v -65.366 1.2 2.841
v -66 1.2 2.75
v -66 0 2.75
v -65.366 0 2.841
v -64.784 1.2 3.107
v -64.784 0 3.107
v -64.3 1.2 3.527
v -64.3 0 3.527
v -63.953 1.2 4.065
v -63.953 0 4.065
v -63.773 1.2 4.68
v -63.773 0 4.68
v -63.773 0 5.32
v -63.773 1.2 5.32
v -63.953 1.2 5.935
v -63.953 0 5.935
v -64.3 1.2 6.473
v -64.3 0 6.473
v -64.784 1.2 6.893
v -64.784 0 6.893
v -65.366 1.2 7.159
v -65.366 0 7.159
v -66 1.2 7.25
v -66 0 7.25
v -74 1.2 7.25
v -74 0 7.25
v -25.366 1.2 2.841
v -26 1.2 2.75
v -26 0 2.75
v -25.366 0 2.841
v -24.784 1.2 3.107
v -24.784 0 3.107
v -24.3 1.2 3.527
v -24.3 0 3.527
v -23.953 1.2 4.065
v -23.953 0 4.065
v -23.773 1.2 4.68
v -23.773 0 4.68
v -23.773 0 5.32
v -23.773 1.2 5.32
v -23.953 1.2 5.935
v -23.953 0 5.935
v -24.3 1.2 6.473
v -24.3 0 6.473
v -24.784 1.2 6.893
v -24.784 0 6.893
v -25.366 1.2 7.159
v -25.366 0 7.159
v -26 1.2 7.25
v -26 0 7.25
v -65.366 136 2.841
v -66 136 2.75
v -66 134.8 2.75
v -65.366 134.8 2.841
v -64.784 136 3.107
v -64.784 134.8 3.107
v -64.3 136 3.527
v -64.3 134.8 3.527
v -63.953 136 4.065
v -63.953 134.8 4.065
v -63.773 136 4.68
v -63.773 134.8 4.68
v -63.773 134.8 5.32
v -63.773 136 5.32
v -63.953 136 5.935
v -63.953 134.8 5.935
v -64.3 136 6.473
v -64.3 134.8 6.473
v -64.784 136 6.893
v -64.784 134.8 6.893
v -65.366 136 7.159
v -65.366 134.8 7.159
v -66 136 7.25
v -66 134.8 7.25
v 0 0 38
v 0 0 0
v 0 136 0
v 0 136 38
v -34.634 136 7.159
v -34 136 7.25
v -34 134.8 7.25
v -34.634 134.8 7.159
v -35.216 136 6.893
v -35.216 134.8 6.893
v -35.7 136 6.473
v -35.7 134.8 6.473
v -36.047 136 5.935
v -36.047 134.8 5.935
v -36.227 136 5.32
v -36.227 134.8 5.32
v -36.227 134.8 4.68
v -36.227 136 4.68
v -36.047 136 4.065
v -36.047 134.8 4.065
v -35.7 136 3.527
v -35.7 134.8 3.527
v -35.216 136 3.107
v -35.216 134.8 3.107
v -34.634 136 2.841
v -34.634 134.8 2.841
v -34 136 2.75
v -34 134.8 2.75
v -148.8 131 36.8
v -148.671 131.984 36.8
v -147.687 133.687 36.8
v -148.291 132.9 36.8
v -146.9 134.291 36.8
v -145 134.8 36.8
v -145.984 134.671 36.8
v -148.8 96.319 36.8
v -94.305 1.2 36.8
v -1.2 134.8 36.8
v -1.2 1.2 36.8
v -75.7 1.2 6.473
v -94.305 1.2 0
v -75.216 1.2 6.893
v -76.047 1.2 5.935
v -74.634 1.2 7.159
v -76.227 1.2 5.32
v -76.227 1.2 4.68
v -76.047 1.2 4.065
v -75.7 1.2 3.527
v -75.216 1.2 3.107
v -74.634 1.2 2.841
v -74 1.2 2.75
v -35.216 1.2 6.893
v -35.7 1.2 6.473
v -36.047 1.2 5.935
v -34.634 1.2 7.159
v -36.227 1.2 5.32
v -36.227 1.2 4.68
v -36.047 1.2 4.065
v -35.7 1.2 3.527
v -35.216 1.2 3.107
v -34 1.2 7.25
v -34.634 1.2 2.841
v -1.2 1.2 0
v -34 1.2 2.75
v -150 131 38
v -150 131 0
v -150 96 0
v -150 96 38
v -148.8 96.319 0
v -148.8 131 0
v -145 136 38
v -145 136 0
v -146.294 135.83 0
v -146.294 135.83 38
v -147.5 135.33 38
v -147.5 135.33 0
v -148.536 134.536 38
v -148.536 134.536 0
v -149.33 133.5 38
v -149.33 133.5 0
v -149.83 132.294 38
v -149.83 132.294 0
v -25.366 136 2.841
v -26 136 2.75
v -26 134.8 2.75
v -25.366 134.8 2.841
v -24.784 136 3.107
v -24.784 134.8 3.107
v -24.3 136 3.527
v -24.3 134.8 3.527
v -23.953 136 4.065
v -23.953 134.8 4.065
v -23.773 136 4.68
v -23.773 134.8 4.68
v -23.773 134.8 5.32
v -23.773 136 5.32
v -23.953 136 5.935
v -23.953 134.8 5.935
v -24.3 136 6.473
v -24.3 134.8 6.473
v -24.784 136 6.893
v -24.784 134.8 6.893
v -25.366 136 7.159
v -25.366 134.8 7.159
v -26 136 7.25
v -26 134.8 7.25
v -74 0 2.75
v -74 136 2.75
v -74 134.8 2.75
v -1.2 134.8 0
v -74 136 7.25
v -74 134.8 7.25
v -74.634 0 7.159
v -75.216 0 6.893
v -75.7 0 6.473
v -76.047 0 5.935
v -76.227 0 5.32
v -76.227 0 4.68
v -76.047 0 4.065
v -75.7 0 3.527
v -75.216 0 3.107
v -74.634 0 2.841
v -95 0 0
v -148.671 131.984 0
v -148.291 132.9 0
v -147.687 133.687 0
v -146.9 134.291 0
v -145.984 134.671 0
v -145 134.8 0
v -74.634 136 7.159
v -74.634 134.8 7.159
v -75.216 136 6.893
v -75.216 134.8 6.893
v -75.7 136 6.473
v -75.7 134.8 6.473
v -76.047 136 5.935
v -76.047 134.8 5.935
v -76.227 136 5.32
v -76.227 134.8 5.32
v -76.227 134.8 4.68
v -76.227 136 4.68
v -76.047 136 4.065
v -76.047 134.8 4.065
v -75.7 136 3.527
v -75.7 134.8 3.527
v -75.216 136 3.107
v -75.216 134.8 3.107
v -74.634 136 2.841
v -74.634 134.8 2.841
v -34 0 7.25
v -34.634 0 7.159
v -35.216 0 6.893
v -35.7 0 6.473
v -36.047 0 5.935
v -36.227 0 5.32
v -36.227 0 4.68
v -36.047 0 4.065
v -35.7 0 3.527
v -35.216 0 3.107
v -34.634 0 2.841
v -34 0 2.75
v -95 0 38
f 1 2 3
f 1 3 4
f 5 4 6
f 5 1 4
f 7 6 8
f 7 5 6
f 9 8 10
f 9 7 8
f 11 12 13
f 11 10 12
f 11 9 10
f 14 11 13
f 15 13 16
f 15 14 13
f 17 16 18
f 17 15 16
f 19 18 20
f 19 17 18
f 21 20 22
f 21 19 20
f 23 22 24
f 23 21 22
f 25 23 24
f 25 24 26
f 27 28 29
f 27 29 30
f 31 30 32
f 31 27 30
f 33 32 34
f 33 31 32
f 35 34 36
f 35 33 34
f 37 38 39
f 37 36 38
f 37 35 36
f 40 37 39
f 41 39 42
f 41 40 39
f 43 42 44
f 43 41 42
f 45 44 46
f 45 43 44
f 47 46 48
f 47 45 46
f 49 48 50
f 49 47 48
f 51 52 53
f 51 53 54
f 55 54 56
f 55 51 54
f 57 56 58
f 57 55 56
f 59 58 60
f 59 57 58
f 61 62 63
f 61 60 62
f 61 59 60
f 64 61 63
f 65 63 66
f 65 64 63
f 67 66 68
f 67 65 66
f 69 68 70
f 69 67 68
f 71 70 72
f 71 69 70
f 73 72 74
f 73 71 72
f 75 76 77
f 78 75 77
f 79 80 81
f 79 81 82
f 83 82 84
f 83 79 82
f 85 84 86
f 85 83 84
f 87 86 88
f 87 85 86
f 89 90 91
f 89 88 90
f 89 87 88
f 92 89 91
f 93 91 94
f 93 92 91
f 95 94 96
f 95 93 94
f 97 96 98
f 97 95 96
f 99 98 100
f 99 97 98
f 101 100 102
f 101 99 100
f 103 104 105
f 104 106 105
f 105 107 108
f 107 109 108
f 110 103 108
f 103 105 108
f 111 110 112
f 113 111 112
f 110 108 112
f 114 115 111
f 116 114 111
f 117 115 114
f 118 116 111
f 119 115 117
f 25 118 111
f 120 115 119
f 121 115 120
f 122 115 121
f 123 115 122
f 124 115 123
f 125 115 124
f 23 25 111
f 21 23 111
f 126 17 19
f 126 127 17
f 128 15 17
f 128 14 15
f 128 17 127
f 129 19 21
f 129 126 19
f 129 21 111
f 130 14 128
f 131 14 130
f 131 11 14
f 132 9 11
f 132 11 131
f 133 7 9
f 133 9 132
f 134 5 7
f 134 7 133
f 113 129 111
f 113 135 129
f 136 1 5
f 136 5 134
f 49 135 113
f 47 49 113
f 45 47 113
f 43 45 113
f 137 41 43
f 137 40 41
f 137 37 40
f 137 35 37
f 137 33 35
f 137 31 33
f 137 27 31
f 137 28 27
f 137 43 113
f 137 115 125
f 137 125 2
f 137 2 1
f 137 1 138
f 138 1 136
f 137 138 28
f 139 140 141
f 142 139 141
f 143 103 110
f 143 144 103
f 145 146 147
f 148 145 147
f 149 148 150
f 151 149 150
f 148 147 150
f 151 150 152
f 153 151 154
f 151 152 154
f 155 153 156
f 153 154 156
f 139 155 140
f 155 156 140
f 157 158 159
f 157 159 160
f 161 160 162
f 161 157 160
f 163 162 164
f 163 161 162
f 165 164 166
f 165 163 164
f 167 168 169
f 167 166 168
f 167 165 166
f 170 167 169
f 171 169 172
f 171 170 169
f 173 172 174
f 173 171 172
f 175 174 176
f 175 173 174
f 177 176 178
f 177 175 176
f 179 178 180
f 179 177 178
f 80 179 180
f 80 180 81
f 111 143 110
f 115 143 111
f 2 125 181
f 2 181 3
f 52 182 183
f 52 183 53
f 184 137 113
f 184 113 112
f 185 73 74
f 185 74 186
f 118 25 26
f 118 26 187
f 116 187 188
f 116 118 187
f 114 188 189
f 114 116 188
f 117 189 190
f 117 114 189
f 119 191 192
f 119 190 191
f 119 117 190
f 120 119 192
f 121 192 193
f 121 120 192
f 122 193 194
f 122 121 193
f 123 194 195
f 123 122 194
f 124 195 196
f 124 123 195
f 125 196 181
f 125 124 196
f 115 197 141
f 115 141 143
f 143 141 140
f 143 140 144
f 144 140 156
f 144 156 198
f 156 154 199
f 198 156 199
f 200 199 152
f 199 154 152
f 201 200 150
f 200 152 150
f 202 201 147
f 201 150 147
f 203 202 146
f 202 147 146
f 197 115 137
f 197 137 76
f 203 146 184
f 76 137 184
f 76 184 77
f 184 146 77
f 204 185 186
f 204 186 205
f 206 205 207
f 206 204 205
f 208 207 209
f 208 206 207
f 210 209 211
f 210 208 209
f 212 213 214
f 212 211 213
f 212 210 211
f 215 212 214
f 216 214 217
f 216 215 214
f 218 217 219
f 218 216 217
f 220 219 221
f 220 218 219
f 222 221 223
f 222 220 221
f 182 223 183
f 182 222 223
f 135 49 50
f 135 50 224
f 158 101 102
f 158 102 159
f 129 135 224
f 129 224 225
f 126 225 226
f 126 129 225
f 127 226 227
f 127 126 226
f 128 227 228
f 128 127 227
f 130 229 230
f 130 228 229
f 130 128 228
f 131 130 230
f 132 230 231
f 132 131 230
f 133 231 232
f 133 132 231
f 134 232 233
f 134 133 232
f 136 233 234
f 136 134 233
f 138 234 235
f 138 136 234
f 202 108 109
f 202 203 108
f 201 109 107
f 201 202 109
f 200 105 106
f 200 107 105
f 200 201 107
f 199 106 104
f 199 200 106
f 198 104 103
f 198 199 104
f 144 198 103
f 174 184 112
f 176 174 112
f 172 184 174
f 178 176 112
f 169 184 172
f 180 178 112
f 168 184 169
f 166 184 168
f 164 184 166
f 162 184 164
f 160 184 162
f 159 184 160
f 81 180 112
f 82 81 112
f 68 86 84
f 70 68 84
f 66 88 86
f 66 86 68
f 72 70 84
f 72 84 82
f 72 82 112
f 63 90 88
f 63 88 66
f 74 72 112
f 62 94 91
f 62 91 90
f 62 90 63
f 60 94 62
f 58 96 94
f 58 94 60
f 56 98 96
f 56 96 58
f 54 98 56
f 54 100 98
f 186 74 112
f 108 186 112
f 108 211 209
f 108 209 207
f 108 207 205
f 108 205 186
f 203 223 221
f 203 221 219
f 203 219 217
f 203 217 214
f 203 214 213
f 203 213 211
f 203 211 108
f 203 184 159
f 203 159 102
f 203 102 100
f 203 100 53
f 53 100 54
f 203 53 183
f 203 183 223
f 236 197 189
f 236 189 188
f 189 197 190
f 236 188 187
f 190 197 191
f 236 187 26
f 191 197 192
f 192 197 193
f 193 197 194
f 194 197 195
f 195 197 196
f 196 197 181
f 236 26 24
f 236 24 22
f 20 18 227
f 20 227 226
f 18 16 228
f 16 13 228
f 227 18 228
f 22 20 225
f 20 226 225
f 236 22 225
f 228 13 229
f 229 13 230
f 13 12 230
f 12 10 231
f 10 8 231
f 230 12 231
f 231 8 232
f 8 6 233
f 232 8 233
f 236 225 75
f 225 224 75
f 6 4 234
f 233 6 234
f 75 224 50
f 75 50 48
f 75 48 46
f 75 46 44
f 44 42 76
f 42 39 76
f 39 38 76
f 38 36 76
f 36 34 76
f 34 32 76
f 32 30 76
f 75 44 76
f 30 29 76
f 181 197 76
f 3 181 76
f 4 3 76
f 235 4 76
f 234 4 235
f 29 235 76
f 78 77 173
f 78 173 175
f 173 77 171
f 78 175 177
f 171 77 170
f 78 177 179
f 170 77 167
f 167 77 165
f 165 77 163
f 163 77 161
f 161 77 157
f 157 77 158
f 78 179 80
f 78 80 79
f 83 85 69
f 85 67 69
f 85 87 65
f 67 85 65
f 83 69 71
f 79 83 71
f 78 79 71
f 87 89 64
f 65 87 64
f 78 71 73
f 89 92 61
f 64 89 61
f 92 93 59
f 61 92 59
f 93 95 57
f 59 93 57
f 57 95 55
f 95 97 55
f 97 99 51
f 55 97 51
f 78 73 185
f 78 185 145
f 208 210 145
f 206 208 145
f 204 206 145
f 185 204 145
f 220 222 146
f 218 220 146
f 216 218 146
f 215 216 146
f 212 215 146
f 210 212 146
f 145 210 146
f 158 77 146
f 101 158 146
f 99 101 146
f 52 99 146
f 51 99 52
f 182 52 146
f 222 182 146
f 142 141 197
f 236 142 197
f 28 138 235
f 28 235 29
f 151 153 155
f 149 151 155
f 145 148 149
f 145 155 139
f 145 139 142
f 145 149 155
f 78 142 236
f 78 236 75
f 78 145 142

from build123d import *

# Parameters (mm, degrees)
EXTRUDE_1_DEPTH          = 38
SHELL_1_T                = -1.2
CUT_EXTRUDE_1_DEPTH      = 207.009708509
CUT_EXTRUDE_1_DEPTH_BACK = 207.009708509


with BuildPart() as part:
    # 草图1 → 凸台-拉伸1 (new body)
    with BuildSketch(Plane.XY):
        with BuildLine():
            Line((-150, 96), (-95, 0))
            Line((-95, 0), (0, 0))
            Line((0, 0), (0, 136))
            Line((0, 136), (-145, 136))
            ThreePointArc((-145, 136), (-148.535533906, 134.535533906), (-150, 131))
            Line((-150, 131), (-150, 96))
        make_face()
    extrude(amount=EXTRUDE_1_DEPTH)

    # 抽壳1
    shell_1_openings = [part.faces().sort_by_distance(p)[0] for p in [
        (-66.551705403, 73.332757841, 0),
    ]]
    offset(amount=SHELL_1_T, openings=shell_1_openings, kind=Kind.INTERSECTION)

    # 草图3 → 切除-拉伸1 (cut, two sides: drawn at the far end of the back side and taken through both)
    with BuildSketch(Plane.XZ.offset(-CUT_EXTRUDE_1_DEPTH_BACK)):
        with BuildLine():
            Line((-66, 7.25), (-74, 7.25))
            ThreePointArc((-74, 7.25), (-76.25, 5), (-74, 2.75))
            Line((-74, 2.75), (-66, 2.75))
            ThreePointArc((-66, 2.75), (-63.75, 5), (-66, 7.25))
        make_face()
        with BuildLine():
            Line((-26, 7.25), (-34, 7.25))
            ThreePointArc((-34, 7.25), (-36.25, 5), (-34, 2.75))
            Line((-34, 2.75), (-26, 2.75))
            ThreePointArc((-26, 2.75), (-23.75, 5), (-26, 7.25))
        make_face()
    extrude(amount=CUT_EXTRUDE_1_DEPTH + CUT_EXTRUDE_1_DEPTH_BACK, mode=Mode.SUBTRACT)


solid = part.part
